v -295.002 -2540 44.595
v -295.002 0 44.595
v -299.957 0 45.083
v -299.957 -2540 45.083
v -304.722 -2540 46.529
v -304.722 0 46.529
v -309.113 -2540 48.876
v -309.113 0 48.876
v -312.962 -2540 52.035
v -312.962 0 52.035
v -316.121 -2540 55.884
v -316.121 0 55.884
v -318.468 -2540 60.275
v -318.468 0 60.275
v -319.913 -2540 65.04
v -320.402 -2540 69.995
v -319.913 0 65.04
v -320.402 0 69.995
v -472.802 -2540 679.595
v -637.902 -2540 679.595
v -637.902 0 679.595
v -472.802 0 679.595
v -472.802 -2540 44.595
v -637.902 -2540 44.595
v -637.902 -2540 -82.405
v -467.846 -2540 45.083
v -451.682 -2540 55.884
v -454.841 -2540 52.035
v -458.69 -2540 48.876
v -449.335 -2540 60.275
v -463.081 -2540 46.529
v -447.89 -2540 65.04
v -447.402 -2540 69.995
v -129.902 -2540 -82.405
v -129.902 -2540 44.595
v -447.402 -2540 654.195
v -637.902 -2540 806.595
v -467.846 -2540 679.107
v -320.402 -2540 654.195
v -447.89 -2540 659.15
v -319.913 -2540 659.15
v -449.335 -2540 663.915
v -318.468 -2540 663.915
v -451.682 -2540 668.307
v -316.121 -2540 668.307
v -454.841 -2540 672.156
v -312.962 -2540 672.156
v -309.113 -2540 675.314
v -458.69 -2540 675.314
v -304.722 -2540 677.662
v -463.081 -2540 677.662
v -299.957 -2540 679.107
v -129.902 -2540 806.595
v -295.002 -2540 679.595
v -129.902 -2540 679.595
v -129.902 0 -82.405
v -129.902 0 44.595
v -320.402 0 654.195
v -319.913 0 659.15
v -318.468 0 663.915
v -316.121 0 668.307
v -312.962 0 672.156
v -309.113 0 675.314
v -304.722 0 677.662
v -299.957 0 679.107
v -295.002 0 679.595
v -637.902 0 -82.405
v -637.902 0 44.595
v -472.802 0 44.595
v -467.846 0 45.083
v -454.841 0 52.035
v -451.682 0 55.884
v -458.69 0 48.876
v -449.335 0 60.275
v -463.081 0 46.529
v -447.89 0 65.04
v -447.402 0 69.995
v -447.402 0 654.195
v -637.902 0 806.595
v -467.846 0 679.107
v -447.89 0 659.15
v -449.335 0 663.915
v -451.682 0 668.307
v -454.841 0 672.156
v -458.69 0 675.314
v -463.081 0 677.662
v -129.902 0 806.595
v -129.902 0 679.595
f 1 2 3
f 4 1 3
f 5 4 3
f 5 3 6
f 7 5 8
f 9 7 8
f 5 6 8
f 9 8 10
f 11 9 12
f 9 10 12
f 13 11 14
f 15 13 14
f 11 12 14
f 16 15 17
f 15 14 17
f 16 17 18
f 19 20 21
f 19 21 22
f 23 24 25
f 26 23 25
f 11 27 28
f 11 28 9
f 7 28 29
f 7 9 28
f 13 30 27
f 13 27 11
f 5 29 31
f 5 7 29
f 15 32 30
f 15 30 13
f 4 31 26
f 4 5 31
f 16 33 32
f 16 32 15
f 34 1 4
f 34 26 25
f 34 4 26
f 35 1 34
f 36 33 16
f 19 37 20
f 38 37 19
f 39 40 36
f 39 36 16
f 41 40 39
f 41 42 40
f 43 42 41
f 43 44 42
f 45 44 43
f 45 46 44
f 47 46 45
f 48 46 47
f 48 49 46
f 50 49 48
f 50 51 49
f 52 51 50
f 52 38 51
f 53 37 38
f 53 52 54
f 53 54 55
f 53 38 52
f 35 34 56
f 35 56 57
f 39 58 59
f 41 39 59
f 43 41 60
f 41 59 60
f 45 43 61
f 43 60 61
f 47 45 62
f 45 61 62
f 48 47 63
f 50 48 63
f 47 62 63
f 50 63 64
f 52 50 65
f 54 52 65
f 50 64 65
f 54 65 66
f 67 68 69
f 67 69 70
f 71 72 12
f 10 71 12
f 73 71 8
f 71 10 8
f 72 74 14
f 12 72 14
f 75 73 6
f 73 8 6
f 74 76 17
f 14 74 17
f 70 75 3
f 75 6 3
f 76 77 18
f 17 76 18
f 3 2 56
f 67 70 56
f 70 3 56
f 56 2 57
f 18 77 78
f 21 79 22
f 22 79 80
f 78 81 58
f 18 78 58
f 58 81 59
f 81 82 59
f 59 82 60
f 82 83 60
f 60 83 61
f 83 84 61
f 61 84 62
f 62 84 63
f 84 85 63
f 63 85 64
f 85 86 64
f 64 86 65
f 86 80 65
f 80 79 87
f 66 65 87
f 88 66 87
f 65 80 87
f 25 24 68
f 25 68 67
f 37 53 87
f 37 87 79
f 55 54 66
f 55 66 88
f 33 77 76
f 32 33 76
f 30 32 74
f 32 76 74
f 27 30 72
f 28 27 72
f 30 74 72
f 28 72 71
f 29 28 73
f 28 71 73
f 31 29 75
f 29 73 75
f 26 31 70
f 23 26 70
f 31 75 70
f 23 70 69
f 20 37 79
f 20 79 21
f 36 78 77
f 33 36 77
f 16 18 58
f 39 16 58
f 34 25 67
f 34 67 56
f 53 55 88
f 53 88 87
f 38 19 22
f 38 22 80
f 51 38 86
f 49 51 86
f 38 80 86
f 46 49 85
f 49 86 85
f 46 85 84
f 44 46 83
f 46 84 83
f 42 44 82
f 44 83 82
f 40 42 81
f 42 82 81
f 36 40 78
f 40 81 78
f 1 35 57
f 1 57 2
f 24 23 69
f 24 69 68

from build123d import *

# Parameters (mm, degrees)
F1_DEPTH = 2540


with BuildPart() as f1:
    # F0 (on Front) → F1 (new body)
    with BuildSketch(Plane.XZ):
        with BuildLine():
            Line((-637.901507, -82.404926), (-129.901507, -82.404926))
            Line((-129.901507, -82.404926), (-129.901507, 44.595074))
            Line((-129.901507, 44.595074), (-295.001507, 44.595074))
            ThreePointArc((-295.001507, 44.595074), (-312.962019, 52.034562), (-320.401507, 69.995074))
            Line((-320.401507, 69.995074), (-320.401507, 654.195074))
            ThreePointArc((-320.401507, 654.195074), (-312.962019, 672.155587), (-295.001507, 679.595074))
            Line((-295.001507, 679.595074), (-129.901507, 679.595074))
            Line((-129.901507, 679.595074), (-129.901507, 806.595074))
            Line((-129.901507, 806.595074), (-637.901507, 806.595074))
            Line((-637.901507, 806.595074), (-637.901507, 679.595074))
            Line((-637.901507, 679.595074), (-472.801507, 679.595074))
            ThreePointArc((-472.801507, 679.595074), (-454.840994, 672.155587), (-447.401507, 654.195074))
            Line((-447.401507, 654.195074), (-447.401507, 69.995074))
            ThreePointArc((-447.401507, 69.995074), (-454.840994, 52.034562), (-472.801507, 44.595074))
            Line((-472.801507, 44.595074), (-637.901507, 44.595074))
            Line((-637.901507, 44.595074), (-637.901507, -82.404926))
        make_face()
    extrude(amount=F1_DEPTH)


solid = f1.part
